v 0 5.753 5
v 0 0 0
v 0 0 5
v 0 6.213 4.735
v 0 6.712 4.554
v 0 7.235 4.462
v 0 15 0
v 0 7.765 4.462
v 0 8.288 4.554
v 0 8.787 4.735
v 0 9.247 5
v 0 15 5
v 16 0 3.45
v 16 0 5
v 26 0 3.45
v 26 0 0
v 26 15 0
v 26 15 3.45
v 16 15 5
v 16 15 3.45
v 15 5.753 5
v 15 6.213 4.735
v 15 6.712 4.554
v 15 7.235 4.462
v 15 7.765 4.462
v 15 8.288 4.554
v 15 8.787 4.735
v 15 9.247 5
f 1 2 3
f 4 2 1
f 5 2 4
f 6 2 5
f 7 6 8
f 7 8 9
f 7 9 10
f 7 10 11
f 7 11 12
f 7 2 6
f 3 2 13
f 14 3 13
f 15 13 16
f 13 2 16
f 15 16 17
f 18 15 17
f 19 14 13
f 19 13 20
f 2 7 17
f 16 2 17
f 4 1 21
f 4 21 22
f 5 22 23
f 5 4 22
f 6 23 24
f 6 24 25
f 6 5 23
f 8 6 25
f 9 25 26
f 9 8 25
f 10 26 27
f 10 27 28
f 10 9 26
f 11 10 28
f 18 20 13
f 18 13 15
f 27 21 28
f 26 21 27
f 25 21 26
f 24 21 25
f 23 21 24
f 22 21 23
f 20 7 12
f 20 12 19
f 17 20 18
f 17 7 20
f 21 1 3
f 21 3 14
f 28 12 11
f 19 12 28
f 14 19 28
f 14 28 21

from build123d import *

# Parameters (mm, degrees)
SKIZZE1_W                       = 26
SKIZZE1_H                       = 15
AUFSATZ_LINEAR_AUSTRAGEN1_DEPTH = 5
SCHNITT_LINEAR_AUSTRAGEN1_DEPTH = 15
SKIZZE3_W                       = 10
SKIZZE3_H                       = 15
SCHNITT_LINEAR_AUSTRAGEN2_DEPTH = 1.55


with BuildPart() as part:
    # Skizze1 → Aufsatz-Linear austragen1 (new body)
    with BuildSketch(Plane.XY):
        with Locations((13, 7.5)):
            Rectangle(SKIZZE1_W, SKIZZE1_H)
    extrude(amount=AUFSATZ_LINEAR_AUSTRAGEN1_DEPTH)

    # Skizze2 → Schnitt-Linear austragen1 (cut)
    with BuildSketch(Plane.ZY):
        with BuildLine():
            Line((5, 9.247140521), (5, 5.752859479))
            ThreePointArc((5, 5.752859479), (4.45, 7.5), (5, 9.247140521))
        make_face()
    extrude(amount=-SCHNITT_LINEAR_AUSTRAGEN1_DEPTH, mode=Mode.SUBTRACT)

    # Skizze3 → Schnitt-Linear austragen2 (cut)
    with BuildSketch(Plane.XY.offset(5)):
        with Locations((21, 7.5)):
            Rectangle(SKIZZE3_W, SKIZZE3_H)
    extrude(amount=-SCHNITT_LINEAR_AUSTRAGEN2_DEPTH, mode=Mode.SUBTRACT)


solid = part.part
